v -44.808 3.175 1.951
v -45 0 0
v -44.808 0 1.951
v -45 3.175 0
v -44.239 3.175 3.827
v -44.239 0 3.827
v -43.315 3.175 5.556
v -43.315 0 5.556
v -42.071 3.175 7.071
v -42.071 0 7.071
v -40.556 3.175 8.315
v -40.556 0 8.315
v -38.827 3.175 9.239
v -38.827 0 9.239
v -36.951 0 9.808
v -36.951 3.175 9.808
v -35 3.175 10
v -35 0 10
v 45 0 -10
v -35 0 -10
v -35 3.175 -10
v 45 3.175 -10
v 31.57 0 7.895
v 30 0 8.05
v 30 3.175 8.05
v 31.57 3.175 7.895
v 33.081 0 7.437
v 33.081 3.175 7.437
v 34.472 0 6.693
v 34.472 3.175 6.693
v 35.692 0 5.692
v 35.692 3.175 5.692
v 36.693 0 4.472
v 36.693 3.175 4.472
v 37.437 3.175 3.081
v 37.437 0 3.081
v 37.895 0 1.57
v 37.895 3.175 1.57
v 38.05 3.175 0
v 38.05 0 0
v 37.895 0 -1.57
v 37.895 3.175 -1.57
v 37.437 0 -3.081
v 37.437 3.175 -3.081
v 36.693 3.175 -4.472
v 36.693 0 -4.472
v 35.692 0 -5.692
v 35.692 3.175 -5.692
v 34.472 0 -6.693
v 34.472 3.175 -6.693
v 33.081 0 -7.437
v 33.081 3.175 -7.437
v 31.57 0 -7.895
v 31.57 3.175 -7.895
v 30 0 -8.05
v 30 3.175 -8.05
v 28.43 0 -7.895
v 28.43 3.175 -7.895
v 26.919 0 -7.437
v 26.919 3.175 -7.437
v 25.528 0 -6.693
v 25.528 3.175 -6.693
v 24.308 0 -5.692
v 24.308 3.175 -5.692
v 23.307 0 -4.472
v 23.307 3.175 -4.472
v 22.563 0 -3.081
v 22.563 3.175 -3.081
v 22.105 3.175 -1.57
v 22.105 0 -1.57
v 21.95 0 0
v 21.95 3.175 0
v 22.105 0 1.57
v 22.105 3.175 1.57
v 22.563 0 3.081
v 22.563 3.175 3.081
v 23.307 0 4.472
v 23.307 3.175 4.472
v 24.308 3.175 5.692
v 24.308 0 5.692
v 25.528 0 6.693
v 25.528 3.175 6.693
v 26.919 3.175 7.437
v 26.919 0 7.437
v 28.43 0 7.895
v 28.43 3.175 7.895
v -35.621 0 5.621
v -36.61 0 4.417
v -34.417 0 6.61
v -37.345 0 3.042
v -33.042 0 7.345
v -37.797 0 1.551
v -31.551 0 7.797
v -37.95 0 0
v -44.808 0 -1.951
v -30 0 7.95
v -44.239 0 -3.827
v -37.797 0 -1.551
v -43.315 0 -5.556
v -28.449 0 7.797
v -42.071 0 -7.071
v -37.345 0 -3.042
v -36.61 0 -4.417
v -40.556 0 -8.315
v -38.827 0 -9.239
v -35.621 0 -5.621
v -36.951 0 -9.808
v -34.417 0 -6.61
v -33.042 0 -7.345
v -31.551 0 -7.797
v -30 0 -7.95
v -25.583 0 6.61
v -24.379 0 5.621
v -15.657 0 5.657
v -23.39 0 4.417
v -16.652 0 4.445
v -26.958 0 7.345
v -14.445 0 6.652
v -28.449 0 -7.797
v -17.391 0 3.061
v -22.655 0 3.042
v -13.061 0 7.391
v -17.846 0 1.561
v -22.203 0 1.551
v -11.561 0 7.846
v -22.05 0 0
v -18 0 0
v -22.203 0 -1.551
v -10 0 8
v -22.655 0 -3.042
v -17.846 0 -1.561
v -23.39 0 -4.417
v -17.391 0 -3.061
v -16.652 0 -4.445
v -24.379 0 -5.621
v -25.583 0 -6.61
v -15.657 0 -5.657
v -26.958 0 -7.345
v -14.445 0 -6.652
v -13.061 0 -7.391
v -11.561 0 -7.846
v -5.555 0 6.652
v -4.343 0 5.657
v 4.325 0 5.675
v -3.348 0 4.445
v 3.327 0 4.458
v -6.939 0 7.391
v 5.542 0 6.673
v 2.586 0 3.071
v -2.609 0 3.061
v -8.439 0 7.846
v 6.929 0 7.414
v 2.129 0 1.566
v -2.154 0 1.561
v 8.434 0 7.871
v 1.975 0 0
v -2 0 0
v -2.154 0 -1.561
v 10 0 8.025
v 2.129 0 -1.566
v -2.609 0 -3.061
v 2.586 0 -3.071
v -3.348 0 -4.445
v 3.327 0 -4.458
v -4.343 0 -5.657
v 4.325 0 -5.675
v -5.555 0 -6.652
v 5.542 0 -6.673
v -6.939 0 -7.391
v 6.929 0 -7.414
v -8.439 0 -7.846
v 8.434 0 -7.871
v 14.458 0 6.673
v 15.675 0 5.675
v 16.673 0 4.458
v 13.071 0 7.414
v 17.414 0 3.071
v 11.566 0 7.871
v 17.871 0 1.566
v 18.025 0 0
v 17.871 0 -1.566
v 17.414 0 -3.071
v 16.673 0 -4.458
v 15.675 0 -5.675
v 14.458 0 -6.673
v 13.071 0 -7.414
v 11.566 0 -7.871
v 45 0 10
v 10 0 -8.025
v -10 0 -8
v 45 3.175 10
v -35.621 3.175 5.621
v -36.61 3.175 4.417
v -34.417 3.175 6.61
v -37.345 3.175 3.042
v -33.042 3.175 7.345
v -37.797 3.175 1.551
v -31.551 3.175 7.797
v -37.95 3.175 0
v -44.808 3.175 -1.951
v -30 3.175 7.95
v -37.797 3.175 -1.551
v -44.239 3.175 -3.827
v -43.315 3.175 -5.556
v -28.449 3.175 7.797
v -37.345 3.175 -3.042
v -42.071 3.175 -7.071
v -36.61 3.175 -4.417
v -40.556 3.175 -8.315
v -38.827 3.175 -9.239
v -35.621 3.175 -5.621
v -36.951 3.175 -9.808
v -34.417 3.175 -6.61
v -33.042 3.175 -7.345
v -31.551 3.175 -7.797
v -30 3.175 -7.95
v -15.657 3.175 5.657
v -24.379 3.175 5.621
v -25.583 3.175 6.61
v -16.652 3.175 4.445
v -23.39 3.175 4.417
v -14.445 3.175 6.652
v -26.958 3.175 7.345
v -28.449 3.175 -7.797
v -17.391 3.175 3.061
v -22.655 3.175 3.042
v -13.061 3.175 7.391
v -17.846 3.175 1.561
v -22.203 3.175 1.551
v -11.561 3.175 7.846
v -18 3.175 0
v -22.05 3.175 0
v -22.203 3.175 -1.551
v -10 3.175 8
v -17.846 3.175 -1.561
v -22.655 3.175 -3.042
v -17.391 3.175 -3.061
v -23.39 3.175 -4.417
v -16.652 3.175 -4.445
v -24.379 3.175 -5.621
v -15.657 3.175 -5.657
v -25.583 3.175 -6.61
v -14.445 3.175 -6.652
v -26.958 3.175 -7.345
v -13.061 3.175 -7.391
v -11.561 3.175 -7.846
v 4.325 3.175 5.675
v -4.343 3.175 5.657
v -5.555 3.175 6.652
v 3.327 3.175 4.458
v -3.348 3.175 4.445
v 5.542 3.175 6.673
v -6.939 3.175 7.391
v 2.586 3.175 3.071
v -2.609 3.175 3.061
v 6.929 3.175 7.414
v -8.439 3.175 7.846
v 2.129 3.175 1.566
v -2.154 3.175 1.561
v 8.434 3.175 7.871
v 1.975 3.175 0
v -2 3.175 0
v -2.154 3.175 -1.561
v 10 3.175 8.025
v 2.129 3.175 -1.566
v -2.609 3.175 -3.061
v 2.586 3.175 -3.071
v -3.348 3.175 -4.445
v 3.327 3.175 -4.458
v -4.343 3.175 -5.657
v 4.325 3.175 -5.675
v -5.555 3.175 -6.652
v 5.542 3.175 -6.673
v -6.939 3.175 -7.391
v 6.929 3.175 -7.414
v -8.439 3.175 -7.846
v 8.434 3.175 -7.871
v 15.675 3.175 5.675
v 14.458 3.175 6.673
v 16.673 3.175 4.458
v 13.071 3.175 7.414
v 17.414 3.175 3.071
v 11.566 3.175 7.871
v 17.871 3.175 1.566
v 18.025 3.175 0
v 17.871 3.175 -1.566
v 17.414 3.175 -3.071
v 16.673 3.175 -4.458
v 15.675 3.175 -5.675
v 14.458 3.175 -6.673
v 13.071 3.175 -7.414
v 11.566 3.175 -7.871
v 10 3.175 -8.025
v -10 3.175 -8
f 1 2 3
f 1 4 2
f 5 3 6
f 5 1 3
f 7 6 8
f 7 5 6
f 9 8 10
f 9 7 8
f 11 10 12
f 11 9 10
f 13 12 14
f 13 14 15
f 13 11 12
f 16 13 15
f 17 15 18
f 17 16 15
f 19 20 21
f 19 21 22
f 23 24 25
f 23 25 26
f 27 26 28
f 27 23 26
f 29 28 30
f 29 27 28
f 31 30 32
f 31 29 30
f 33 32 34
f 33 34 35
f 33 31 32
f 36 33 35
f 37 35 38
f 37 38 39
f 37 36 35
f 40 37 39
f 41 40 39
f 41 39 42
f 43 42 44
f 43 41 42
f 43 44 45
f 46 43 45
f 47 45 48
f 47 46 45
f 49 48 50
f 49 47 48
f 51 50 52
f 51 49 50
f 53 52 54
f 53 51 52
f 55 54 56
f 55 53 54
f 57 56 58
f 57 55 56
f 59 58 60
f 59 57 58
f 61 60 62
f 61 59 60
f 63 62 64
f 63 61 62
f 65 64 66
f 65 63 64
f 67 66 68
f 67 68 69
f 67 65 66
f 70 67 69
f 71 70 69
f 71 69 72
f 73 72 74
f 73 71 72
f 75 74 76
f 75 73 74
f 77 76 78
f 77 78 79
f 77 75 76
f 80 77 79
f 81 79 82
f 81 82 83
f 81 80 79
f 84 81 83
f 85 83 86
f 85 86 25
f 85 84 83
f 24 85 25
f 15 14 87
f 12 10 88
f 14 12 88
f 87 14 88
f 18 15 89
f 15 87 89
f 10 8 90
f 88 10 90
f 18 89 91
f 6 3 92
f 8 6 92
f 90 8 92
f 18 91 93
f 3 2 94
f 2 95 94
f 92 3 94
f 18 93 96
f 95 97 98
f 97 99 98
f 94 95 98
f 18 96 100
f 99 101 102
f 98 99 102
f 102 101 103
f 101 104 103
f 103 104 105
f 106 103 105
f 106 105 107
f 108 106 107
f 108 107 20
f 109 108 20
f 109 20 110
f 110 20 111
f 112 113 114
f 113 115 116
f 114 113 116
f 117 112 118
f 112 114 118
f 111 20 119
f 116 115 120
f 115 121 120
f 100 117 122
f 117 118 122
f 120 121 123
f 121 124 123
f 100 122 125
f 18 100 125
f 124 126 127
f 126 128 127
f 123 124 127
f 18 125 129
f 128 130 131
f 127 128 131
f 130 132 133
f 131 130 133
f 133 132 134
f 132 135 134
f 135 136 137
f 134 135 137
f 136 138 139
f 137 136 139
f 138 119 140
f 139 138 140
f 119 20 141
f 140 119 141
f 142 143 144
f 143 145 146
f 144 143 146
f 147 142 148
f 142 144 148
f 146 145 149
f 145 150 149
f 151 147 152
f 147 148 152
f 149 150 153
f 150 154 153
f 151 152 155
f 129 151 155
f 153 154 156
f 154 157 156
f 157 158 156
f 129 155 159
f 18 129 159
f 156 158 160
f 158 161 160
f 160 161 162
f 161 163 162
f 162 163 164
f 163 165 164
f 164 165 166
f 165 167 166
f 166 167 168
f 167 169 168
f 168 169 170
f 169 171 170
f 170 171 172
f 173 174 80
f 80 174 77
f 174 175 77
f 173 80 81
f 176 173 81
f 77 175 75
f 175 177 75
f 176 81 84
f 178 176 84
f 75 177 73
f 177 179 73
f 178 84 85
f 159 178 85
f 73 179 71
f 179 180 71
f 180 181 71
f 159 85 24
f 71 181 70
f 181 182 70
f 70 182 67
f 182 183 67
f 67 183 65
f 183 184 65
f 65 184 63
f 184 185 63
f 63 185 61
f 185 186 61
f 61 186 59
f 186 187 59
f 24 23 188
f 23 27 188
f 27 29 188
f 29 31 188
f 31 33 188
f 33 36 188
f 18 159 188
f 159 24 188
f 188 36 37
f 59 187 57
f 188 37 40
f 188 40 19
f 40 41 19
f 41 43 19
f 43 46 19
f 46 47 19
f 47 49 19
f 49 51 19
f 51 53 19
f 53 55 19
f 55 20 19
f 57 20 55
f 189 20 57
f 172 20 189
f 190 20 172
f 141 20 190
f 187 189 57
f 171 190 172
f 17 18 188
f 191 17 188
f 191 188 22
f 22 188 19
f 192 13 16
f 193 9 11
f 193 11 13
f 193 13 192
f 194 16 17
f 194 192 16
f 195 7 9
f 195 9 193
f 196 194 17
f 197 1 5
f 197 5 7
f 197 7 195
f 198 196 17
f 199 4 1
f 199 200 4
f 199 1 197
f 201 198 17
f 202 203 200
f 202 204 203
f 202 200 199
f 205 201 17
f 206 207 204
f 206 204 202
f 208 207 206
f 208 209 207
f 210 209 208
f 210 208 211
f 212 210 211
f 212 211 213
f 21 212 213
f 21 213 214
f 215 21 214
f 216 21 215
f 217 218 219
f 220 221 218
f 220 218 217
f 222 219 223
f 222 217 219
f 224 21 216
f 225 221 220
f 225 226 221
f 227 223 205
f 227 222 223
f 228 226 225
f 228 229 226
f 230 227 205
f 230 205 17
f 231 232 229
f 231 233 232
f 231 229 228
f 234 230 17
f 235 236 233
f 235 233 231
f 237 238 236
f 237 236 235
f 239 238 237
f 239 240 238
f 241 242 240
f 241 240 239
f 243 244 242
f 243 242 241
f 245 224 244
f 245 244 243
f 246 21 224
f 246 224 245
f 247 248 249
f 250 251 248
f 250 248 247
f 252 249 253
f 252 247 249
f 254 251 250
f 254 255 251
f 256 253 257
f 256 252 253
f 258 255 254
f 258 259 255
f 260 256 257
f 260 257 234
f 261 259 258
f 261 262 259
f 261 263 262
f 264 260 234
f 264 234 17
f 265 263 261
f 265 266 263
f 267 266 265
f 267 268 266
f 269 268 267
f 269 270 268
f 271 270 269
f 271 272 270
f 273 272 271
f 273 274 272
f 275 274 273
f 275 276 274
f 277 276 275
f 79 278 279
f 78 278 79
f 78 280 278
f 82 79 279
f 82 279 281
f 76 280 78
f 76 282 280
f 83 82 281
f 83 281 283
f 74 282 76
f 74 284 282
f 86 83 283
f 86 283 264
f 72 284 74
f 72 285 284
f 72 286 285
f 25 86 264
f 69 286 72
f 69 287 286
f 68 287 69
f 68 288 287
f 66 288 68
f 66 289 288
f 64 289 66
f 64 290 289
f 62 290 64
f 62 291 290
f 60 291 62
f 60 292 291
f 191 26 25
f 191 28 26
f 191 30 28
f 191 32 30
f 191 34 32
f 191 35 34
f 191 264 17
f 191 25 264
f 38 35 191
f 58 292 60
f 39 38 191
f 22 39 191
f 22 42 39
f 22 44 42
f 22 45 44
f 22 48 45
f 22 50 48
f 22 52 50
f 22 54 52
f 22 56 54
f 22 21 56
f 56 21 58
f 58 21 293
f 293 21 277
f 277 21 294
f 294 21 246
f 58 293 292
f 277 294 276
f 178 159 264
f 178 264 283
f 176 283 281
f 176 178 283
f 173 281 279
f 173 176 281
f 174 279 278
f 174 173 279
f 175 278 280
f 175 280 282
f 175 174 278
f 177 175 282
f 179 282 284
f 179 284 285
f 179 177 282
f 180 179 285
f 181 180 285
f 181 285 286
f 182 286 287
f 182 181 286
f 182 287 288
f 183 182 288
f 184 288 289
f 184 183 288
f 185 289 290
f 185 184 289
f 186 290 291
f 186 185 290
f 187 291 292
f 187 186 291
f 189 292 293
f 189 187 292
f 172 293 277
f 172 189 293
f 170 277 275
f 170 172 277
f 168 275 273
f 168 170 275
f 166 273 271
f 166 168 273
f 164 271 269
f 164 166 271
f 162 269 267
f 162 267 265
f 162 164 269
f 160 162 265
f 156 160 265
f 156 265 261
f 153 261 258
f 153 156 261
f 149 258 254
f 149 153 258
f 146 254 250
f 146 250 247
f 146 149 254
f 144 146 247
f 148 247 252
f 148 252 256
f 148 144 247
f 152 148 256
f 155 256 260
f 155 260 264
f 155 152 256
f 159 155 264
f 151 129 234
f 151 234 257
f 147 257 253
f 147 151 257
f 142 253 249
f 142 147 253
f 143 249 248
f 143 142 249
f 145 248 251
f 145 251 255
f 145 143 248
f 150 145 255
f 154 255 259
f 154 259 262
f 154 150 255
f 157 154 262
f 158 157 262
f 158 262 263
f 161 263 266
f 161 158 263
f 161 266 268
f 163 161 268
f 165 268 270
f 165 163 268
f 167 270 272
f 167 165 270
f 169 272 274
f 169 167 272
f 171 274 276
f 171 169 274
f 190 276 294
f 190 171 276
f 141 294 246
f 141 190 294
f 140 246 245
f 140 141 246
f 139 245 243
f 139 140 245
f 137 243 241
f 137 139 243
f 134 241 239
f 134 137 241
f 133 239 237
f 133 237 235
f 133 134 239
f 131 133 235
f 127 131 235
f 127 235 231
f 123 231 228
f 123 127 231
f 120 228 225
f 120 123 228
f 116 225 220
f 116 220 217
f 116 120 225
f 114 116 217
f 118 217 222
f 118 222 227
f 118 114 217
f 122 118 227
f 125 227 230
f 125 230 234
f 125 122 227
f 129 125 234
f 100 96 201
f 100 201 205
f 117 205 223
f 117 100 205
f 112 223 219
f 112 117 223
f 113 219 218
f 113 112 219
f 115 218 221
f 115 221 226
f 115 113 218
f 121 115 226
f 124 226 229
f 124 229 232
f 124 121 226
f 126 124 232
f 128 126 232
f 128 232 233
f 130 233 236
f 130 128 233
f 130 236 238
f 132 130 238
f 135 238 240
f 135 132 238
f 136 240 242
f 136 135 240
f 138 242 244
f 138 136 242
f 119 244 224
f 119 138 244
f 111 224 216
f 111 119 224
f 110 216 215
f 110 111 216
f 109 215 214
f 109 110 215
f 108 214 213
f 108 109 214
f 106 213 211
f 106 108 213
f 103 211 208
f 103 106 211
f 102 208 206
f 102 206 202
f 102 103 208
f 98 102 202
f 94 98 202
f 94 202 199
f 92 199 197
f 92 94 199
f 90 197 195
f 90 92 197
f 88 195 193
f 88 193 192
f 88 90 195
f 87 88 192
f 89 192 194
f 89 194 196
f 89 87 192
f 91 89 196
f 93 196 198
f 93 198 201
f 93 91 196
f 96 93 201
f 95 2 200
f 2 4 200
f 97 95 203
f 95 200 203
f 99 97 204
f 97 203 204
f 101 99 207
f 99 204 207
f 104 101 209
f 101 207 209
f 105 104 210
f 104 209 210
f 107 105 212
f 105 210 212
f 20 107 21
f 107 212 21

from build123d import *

# Parameters (mm, degrees)
SKETCH1_W           = 90
SKETCH1_H           = 20
SKETCH1_R           = 7.95
SKETCH1_R_2         = 8
SKETCH1_R_3         = 8.025
SKETCH1_R_4         = 8.05
BOSS_EXTRUDE1_DEPTH = 3.175
FILLET1_R           = 10


with BuildPart() as part:
    # Sketch1 → Boss-Extrude1 (new body)
    with BuildSketch(Plane(origin=(0, 0, 0), x_dir=(1, 0, 0), z_dir=(0, 1, 0))):
        Rectangle(SKETCH1_W, SKETCH1_H)
        with Locations(Location((-30, 0, 0), (0, 0, 270))):
            Circle(SKETCH1_R, mode=Mode.SUBTRACT)
        with Locations(Location((-10, 0, 0), (0, 0, 270))):
            Circle(SKETCH1_R_2, mode=Mode.SUBTRACT)
        with Locations(Location((10, 0, 0), (0, 0, 270))):
            Circle(SKETCH1_R_3, mode=Mode.SUBTRACT)
        with Locations(Location((30, 0, 0), (0, 0, 270))):
            Circle(SKETCH1_R_4, mode=Mode.SUBTRACT)
    extrude(amount=BOSS_EXTRUDE1_DEPTH)

    # Fillet1
    fillet1_edges = [part.edges().sort_by_distance(p)[0] for p in [
        (-45, 1.5875, -10),
        (-45, 1.5875, 10),
    ]]
    fillet(fillet1_edges, radius=FILLET1_R - 0.0001)  # a hair under: the kernel refuses the full size


solid = part.part
